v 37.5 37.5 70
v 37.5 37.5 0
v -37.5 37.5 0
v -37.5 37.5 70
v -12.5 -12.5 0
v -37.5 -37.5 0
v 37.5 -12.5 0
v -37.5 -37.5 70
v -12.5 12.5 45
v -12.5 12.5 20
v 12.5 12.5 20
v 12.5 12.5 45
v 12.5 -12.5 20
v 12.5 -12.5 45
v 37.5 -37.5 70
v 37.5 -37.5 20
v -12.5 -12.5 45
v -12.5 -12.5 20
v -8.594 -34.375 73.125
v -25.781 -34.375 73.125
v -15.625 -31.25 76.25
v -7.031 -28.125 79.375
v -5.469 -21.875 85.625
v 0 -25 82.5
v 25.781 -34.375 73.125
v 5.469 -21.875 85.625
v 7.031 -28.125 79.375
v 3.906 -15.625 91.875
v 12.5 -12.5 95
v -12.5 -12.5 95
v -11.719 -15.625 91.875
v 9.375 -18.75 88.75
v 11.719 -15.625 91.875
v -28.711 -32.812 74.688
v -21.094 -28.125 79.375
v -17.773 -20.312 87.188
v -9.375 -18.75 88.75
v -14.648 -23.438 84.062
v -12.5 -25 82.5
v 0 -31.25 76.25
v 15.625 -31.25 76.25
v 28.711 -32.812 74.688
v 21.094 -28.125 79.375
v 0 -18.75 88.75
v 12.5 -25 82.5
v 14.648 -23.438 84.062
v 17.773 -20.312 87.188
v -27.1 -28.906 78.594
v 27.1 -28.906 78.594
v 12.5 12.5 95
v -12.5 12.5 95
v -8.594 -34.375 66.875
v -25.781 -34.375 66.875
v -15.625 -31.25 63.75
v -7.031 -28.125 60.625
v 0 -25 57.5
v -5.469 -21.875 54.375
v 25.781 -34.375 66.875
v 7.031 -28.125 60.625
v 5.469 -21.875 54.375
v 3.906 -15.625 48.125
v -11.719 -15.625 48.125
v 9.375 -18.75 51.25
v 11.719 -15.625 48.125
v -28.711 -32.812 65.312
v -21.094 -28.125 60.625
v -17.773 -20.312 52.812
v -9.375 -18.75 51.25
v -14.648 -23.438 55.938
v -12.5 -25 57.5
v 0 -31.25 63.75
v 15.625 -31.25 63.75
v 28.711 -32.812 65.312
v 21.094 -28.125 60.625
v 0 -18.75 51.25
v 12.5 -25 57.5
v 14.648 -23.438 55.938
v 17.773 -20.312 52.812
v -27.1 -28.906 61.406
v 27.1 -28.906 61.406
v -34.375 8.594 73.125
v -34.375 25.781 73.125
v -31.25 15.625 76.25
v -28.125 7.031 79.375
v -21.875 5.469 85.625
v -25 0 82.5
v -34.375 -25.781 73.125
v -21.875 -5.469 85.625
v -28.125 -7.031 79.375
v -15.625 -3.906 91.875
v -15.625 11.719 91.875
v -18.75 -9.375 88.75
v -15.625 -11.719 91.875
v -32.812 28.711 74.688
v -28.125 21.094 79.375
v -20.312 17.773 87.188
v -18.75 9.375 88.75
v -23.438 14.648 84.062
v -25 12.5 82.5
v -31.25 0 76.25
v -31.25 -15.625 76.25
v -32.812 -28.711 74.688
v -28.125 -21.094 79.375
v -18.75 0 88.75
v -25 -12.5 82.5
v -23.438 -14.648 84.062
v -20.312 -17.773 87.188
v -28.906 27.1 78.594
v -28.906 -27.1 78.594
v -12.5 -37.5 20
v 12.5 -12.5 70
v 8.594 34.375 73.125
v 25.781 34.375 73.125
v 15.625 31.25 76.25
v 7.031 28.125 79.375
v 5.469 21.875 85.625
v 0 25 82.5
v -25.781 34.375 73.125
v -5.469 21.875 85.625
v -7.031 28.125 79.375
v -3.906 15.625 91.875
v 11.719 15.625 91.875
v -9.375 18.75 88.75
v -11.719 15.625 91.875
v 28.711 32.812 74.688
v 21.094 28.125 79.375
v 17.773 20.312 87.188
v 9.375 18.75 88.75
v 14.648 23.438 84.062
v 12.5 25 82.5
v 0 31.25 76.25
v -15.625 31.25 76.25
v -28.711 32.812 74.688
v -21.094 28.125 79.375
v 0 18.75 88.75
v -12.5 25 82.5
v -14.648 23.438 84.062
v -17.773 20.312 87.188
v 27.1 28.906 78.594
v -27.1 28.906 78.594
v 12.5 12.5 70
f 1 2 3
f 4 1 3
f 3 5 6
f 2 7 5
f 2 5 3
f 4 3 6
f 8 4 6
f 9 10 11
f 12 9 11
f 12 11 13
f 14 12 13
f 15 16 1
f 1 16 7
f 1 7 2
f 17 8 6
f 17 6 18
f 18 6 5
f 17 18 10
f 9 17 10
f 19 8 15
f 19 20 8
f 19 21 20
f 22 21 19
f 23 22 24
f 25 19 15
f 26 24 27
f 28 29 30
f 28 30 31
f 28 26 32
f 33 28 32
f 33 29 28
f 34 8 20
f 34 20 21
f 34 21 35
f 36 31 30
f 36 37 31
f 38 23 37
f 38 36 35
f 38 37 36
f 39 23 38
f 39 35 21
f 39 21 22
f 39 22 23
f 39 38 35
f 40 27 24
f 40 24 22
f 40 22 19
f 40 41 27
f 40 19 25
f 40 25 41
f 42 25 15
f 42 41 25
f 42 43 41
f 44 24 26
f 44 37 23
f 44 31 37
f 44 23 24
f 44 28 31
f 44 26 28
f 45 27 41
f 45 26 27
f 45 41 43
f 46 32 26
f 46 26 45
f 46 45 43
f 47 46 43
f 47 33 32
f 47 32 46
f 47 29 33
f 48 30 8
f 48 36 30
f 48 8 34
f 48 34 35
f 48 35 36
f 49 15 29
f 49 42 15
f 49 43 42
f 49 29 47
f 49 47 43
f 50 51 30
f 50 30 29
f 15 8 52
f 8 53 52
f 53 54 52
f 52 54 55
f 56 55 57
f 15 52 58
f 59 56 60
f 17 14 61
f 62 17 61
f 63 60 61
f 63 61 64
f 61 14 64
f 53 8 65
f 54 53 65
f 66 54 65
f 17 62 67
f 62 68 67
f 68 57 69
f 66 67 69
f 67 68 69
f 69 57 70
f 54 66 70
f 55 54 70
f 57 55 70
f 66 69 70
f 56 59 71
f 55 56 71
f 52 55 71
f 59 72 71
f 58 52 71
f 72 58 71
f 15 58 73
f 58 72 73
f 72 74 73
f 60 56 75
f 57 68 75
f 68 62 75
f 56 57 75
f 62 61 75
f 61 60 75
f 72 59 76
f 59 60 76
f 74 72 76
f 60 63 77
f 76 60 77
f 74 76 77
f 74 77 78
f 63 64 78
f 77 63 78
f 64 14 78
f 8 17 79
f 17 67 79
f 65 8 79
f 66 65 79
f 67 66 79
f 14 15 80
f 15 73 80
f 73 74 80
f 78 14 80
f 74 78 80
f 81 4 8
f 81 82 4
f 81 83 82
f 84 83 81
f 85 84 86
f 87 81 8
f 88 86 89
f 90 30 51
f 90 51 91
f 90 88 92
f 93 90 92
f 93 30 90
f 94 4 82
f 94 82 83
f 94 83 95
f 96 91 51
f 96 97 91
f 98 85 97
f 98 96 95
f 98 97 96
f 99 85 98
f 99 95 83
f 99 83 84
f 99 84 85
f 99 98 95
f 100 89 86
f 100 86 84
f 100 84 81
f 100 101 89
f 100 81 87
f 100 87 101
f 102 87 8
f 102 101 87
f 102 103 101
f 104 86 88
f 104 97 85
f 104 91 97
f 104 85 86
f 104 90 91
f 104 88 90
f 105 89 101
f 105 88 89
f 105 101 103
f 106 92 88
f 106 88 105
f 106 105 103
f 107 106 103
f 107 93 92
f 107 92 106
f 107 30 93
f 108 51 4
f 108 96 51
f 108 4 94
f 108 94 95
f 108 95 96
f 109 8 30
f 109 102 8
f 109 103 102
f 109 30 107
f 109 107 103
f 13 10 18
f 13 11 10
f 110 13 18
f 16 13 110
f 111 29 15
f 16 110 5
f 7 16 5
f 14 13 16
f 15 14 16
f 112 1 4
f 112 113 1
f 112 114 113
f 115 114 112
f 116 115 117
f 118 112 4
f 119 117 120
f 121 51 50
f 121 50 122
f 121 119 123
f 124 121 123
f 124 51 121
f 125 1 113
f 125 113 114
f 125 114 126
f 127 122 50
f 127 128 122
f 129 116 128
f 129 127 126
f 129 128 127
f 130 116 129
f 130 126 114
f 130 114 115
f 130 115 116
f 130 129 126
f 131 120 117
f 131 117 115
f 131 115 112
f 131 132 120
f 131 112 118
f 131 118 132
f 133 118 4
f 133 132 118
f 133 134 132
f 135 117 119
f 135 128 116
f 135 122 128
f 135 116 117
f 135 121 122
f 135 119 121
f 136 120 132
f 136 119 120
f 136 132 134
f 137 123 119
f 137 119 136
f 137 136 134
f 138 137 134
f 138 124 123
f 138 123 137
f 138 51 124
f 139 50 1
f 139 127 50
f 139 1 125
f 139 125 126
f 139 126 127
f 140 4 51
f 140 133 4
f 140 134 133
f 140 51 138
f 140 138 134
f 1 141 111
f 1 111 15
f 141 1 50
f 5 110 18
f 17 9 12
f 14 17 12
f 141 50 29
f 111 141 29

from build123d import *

# Parameters (mm, degrees)
F5_W           = 75
F5_H           = 75
F4_W           = 25
F4_H           = 25
F7_W           = 25
F7_H           = 25
F10_DEPTH      = 70.0000001
F11_DEPTH      = 70.00000015
F12_DEPTH      = 70.00000015
F14_DEPTH      = 37.5
F14_DEPTH_BACK = 12.5
F16_REACH      = 107.0166212872
F18_DEPTH      = 25


with BuildPart() as f6:
    # F5 (on offset) → F6 section 0
    with BuildSketch(Plane.XY.offset(70)):
        Rectangle(F5_W, F5_H)
    # F4 (on offset) → F6 section 1
    with BuildSketch(Plane.XY.offset(95)):
        Rectangle(F4_W, F4_H)
    loft()

    # F5 (on offset) → F8 section 0
    with BuildSketch(Plane.XY.offset(70)):
        Rectangle(F5_W, F5_H)
    # F7 (on offset) → F8 section 1
    with BuildSketch(Plane.XY.offset(45)):
        Rectangle(F7_W, F7_H)
    loft()

    # F9 (on Top) → F10 (join, through all)
    with BuildSketch(Plane.XY):
        Polygon((37.5, 37.5), (-37.5, 37.5), (-12.5, 12.5), (12.5, 12.5), align=None)
    extrude(amount=F10_DEPTH)

    # F9 (on Top) → F11 (join, through all)
    with BuildSketch(Plane.XY):
        Polygon((-37.5, 37.5), (-37.5, -37.5), (-12.5, -12.5), (-12.5, 12.5), align=None)
    extrude(amount=F11_DEPTH)

    # F9 (on Top) → F12 (join, through all)
    with BuildSketch(Plane.XY):
        Polygon((12.5, -12.5), (37.5, -37.5), (37.5, 37.5), (12.5, 12.5), align=None)
    extrude(amount=F12_DEPTH)

    # F13 (on Right) → F14 (join, two sides)
    with BuildSketch(Plane.YZ) as f14_sk:
        Polygon((-37.5, 20), (-12.5, 0), (12.5, 0), (12.5, 20), align=None)
    extrude(amount=F14_DEPTH)
    extrude(f14_sk.sketch, amount=-F14_DEPTH_BACK)

    f16_end = f6.faces().sort_by_distance((-25.9057971014, -25.9057971014, 29.2028985507))[0]
    # F15 (on face) → F16 (cut, up to a face of the model that its end follows)
    with BuildSketch(Plane.YZ.offset(37.5)):
        Polygon((-37.5, 0), (-12.5, 0), (-37.5, 20), align=None)
    f16_long = extrude(amount=-F16_REACH, mode=Mode.PRIVATE)
    add(split(f16_long, bisect_by=f16_end, keep=Keep.TOP, mode=Mode.PRIVATE), mode=Mode.SUBTRACT)

    # F17 (on offset) → F18 (cut, through all)
    with BuildSketch(Plane.XY.offset(95)):
        Polygon((12.5, 12.5), (12.5, -12.5), (37.5, -37.5), (37.5, -12.5), (37.5, 37.5), align=None)
    extrude(amount=-F18_DEPTH, mode=Mode.SUBTRACT)


solid = f6.part
